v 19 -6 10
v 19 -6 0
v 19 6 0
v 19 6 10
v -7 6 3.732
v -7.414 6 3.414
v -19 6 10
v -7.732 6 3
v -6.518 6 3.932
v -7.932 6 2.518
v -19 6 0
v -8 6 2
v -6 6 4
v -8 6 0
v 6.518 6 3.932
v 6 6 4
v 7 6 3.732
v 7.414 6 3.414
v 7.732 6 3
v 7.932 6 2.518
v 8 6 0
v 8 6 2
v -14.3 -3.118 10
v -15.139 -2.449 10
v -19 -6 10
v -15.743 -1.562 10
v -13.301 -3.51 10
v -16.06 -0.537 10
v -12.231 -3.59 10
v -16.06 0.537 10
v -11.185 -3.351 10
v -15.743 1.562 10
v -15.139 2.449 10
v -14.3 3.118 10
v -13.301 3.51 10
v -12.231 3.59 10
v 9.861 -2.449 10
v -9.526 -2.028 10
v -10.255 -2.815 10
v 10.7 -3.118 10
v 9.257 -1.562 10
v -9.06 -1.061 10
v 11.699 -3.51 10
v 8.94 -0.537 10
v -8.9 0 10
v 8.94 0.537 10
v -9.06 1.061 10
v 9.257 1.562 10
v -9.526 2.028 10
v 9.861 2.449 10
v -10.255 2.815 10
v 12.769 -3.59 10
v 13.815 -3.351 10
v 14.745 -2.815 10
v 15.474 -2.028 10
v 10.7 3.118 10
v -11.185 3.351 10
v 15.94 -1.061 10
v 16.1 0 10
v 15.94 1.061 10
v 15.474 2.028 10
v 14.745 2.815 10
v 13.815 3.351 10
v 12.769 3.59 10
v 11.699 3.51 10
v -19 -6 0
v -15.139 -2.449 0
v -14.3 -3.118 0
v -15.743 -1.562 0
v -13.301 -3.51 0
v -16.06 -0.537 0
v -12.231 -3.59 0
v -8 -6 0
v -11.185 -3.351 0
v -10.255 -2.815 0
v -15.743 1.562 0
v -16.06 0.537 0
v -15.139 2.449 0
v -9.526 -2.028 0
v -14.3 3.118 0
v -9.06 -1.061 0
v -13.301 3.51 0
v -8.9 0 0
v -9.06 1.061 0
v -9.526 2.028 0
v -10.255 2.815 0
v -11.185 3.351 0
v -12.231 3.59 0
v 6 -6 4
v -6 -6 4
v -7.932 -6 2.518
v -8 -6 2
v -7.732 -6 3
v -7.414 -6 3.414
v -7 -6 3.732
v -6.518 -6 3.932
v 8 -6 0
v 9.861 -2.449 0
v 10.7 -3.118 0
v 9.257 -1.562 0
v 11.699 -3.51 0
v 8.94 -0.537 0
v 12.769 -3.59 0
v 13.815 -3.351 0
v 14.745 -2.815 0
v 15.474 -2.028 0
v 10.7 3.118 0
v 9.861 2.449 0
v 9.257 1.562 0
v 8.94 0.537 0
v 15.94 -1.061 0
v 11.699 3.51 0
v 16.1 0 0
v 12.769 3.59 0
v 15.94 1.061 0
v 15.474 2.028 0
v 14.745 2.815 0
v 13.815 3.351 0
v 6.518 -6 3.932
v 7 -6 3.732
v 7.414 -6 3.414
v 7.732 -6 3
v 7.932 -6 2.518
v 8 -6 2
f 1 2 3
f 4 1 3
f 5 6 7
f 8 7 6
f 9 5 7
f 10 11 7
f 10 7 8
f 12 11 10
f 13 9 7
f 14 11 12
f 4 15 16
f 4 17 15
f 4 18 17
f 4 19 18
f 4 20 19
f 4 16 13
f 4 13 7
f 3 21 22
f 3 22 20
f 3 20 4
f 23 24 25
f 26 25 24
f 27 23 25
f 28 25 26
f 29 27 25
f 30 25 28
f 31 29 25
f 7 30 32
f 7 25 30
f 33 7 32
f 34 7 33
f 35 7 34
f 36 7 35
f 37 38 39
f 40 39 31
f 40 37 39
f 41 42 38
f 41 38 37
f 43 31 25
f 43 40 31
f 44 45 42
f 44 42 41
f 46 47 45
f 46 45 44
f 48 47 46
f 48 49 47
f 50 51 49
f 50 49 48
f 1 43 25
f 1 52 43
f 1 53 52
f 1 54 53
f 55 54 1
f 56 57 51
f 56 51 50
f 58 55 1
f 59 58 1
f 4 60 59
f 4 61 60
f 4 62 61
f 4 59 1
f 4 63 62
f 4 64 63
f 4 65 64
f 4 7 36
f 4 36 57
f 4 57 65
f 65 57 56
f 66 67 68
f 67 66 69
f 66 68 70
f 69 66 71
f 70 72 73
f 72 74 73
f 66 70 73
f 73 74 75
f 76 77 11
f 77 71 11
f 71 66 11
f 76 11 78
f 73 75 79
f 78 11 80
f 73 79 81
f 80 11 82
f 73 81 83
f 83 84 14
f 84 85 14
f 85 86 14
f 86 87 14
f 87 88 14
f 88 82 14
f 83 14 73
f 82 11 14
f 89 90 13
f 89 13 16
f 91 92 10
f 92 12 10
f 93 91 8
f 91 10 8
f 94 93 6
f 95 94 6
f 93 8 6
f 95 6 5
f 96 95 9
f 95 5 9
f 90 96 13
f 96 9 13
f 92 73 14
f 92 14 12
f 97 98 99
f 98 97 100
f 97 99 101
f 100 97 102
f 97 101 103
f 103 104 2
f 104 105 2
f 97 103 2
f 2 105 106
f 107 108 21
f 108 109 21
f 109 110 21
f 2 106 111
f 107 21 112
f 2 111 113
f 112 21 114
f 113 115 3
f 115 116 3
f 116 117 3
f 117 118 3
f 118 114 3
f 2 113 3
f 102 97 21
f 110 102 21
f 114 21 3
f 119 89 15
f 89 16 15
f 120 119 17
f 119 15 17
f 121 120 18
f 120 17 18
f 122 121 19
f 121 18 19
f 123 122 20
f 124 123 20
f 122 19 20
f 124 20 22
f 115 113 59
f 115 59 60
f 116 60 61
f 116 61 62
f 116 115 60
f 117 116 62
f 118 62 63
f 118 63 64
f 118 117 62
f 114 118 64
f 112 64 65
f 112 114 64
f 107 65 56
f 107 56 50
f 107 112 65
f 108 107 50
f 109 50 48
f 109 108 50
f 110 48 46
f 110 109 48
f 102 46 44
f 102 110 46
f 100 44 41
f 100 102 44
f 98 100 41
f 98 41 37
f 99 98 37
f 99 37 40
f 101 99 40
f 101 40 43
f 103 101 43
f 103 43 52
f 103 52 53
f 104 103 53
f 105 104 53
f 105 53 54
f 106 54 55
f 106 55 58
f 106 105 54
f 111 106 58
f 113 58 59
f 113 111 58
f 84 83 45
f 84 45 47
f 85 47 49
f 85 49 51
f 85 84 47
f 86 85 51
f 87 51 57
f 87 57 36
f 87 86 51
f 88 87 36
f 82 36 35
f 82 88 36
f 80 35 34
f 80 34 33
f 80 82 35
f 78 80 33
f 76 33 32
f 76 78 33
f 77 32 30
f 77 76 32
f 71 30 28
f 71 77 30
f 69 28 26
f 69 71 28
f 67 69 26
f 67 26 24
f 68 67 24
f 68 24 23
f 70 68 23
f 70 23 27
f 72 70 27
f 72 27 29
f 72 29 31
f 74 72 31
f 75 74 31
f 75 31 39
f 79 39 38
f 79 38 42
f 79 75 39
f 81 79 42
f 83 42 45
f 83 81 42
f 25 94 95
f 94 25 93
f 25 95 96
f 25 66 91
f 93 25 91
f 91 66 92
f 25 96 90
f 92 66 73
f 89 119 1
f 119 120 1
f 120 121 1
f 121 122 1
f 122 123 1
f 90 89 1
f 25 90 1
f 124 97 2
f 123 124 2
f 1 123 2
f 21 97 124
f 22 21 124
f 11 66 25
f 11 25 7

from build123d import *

# Parameters (mm, degrees)
F0_W     = 38
F0_H     = 12
F0_R     = 3.6
F1_DEPTH = 10
F2_W     = 16
F2_H     = 4
F3_DEPTH = 12.001
F4_R     = 2


with BuildPart() as f1:
    # F0 (on Top) → F1 (new body)
    with BuildSketch(Plane.XY):
        Rectangle(F0_W, F0_H)
        with Locations((-12.5, 0)):
            Circle(F0_R, mode=Mode.SUBTRACT)
        with Locations((12.5, 0)):
            Circle(F0_R, mode=Mode.SUBTRACT)
    extrude(amount=F1_DEPTH)

    # F2 (on face) → F3 (cut, through all)
    with BuildSketch(Plane.XZ.offset(6)):
        with Locations((0, 2)):
            Rectangle(F2_W, F2_H)
    extrude(amount=-F3_DEPTH, mode=Mode.SUBTRACT)

    # F4
    f4_edges = [f1.edges().sort_by_distance(p)[0] for p in [
        (-8, 0, 4),
        (8, 0, 4),
    ]]
    fillet(f4_edges, radius=F4_R)


solid = f1.part
